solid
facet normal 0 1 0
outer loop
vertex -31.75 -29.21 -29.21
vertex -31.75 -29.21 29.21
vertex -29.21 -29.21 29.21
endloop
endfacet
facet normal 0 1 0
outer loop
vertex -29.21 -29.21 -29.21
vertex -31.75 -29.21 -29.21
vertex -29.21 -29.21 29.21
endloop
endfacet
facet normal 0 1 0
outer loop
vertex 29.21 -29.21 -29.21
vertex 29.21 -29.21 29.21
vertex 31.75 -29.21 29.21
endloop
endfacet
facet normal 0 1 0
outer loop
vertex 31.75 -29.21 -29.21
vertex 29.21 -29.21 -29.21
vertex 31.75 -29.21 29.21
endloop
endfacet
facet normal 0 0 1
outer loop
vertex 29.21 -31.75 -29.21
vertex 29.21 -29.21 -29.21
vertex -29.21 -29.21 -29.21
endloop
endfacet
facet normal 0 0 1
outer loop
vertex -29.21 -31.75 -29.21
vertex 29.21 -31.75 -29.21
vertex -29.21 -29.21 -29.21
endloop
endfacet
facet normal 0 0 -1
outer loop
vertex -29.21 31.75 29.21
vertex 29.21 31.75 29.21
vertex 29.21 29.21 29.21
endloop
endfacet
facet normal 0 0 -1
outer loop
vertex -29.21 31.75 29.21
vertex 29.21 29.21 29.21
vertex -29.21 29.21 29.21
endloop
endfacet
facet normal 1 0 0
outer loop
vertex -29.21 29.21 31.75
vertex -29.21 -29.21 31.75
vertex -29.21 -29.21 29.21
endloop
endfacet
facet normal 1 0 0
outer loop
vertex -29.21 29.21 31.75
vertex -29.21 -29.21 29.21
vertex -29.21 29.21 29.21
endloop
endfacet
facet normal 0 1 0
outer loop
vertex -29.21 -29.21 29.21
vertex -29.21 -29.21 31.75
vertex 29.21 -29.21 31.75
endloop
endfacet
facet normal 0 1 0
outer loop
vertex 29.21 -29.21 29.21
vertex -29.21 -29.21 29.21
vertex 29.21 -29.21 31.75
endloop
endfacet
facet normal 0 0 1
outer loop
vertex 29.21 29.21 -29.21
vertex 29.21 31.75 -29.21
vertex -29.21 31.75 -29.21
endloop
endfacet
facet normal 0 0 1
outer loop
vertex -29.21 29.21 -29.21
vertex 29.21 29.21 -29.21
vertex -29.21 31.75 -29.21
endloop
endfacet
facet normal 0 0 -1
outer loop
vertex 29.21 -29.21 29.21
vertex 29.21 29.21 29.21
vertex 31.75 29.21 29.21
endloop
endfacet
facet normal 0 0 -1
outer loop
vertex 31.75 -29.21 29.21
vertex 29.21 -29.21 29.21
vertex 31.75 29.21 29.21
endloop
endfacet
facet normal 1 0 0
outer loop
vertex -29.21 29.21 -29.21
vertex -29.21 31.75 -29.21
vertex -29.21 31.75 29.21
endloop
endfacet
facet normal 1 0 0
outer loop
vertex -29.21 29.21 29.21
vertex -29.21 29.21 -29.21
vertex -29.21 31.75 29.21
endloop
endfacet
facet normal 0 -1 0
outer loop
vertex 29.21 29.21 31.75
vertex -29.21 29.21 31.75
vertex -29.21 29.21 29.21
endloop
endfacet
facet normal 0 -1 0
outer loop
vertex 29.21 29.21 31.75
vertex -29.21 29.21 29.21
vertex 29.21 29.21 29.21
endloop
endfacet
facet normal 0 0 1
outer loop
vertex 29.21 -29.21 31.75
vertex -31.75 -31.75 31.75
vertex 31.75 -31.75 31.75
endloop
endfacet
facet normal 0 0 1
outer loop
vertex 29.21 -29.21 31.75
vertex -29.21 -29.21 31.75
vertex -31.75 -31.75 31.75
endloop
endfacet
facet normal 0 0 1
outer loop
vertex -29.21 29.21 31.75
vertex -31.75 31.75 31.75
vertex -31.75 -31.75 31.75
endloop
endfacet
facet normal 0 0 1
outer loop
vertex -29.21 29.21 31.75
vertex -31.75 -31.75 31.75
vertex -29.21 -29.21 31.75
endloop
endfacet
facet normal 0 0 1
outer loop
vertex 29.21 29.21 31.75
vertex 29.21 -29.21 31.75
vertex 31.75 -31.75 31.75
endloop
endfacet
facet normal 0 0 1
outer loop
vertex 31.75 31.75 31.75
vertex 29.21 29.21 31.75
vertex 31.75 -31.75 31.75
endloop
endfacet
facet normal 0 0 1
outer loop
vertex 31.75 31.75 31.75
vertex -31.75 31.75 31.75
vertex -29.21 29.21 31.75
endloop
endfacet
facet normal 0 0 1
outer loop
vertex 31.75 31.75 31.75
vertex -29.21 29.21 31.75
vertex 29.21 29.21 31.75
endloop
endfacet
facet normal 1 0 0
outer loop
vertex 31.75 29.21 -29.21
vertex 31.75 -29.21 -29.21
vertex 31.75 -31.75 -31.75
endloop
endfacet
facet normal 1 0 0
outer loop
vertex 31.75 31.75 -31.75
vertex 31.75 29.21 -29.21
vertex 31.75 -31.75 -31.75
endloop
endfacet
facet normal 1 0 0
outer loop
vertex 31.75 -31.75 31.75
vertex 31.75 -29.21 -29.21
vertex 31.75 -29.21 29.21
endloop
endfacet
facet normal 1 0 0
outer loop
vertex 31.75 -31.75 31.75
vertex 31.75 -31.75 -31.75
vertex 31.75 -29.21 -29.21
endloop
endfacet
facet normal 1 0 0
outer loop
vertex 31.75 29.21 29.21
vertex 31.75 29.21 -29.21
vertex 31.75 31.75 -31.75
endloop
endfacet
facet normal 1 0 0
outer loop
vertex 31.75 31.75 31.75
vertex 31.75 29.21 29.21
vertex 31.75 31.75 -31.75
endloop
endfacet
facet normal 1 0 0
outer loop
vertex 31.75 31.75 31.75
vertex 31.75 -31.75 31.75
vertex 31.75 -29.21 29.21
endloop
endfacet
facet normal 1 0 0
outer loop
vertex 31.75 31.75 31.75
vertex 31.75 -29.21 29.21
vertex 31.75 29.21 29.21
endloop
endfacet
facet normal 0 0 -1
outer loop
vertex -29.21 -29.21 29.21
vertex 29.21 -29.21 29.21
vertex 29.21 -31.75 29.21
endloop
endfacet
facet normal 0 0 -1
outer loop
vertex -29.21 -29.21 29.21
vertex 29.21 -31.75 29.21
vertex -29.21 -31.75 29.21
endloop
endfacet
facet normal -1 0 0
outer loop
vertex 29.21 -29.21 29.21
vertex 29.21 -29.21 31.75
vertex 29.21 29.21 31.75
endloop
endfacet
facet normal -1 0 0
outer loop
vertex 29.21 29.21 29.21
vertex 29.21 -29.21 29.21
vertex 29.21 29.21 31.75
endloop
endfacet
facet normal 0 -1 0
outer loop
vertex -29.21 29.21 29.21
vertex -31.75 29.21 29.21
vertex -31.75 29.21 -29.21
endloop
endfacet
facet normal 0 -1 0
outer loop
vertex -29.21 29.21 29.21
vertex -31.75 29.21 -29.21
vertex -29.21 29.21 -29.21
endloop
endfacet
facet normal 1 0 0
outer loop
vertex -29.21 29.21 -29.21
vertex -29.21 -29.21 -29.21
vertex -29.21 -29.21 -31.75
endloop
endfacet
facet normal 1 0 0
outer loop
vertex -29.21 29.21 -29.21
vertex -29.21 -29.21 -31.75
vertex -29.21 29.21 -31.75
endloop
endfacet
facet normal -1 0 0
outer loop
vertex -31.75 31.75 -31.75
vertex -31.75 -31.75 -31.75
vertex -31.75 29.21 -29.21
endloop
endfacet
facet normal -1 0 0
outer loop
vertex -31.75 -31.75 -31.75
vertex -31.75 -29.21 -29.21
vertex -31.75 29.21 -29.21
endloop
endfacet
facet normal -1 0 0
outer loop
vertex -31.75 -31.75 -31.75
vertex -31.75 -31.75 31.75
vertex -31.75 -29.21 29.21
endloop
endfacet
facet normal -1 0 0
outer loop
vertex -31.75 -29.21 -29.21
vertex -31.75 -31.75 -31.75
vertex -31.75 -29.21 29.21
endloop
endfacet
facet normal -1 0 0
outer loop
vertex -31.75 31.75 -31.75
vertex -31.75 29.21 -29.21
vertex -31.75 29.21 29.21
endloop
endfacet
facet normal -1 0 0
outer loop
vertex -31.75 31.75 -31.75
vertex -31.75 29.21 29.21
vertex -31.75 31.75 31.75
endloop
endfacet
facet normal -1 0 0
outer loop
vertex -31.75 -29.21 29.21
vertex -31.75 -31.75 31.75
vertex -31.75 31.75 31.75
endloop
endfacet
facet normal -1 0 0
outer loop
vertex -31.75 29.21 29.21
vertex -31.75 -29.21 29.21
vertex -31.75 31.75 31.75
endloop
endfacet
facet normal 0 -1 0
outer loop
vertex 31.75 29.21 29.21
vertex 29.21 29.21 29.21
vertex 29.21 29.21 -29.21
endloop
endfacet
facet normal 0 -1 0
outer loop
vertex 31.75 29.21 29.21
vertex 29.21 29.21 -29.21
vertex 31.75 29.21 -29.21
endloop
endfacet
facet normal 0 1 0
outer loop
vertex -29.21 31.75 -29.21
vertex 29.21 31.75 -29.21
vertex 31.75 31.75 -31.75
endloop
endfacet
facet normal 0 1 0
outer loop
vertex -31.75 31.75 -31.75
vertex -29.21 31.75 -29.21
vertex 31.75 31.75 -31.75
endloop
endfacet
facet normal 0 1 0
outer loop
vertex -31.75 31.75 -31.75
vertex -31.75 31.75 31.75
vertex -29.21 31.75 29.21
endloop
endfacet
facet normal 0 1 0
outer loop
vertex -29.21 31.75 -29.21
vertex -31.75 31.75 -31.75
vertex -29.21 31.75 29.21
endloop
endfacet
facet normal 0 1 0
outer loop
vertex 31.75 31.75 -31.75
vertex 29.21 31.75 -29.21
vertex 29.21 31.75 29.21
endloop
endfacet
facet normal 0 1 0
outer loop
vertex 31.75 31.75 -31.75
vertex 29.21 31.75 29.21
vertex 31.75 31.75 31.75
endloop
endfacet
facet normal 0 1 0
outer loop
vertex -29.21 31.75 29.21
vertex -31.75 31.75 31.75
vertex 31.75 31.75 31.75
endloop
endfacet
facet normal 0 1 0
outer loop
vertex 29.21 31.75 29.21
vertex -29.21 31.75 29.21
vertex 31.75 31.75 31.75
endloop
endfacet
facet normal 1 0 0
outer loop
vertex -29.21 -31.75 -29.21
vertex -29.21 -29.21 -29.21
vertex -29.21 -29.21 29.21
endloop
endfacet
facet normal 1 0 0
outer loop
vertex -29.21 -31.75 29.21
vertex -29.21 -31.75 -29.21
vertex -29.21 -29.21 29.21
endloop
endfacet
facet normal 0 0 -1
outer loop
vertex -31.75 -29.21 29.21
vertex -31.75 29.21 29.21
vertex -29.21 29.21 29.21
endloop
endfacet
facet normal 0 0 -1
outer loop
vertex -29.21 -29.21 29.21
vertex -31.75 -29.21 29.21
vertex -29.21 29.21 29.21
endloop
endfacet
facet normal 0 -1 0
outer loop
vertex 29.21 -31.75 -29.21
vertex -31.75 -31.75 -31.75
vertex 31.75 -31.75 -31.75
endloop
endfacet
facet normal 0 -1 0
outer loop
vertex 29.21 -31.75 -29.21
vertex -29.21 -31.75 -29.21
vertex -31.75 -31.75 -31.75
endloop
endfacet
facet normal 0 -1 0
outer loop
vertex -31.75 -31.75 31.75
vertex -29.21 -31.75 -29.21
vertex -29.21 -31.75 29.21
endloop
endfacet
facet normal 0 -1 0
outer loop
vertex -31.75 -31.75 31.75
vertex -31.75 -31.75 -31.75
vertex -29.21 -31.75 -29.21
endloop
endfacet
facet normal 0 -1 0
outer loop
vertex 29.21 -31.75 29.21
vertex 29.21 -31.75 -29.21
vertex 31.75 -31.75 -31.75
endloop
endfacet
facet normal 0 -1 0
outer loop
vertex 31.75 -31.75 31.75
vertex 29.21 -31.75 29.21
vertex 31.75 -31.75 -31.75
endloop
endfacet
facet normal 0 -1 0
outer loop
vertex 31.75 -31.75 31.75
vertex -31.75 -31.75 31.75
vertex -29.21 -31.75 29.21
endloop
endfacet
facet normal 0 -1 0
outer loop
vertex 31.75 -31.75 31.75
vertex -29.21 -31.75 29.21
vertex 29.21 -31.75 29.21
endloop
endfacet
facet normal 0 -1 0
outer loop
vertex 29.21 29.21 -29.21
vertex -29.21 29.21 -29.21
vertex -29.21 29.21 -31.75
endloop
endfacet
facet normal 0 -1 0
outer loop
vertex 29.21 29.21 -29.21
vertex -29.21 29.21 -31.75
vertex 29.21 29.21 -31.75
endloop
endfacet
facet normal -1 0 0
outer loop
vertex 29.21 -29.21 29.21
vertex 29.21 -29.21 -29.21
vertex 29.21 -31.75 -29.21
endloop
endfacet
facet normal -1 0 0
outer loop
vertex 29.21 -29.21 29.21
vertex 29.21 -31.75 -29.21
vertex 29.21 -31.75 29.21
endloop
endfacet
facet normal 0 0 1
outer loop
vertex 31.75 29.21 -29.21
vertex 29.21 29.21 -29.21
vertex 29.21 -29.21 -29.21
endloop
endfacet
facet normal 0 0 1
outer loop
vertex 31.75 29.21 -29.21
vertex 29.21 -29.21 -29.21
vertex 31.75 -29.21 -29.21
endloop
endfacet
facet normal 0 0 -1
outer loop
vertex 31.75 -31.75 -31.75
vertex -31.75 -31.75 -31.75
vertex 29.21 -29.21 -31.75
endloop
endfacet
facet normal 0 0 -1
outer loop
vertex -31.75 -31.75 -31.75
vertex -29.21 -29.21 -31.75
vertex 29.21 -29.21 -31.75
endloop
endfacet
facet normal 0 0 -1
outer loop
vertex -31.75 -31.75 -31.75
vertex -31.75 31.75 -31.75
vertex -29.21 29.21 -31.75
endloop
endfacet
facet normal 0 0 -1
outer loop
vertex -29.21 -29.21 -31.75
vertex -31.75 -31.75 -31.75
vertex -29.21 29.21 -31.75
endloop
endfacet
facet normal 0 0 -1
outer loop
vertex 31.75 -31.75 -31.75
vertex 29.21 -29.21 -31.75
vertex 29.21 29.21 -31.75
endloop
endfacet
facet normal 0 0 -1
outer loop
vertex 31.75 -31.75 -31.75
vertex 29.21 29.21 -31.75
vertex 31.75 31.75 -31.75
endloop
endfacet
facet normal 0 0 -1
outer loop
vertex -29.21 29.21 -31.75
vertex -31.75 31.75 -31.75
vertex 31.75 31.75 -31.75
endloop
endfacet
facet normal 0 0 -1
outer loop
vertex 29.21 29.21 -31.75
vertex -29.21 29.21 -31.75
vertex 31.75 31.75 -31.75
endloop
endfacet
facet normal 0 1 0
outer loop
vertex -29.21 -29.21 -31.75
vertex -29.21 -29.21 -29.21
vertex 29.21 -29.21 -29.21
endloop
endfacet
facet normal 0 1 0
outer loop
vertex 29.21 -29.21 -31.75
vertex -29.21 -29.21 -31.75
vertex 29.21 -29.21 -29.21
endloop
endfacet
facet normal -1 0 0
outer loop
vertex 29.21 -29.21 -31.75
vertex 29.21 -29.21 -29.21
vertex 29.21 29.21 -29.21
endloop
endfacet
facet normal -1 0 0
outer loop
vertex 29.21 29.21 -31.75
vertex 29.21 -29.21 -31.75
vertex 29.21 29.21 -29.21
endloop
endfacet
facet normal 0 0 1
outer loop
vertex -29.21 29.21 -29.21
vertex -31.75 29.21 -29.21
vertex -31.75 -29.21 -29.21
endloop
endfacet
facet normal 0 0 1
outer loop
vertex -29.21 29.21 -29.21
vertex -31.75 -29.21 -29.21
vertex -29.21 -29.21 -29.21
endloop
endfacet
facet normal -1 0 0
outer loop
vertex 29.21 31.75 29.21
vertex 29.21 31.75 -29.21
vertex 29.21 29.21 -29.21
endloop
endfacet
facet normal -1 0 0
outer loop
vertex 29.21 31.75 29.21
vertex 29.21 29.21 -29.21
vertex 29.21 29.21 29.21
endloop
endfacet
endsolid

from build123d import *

# Parameters (mm, degrees)
F0_W     = 63.5
F0_H     = 63.5
F1_DEPTH = 31.75
F2_T     = -2.54
F3_DEPTH = 2.541
F4_W     = 58.42
F4_H     = 58.42
F5_DEPTH = 63.501
F6_W     = 58.42
F6_H     = 58.42
F7_DEPTH = 63.501


with BuildPart() as f1:
    # F0 (on Top) → F1 (new body, symmetric)
    with BuildSketch(Plane.XY):
        Rectangle(F0_W, F0_H)
    extrude(amount=F1_DEPTH, both=True)

    # F2
    f2_openings = [f1.faces().sort_by_distance(p)[0] for p in [
        (-31.75, 0, 0),
    ]]
    offset(amount=F2_T, openings=f2_openings)

    # F3 (cut, through all): a face of the model
    f3_faces = [f1.faces().sort_by_distance(p)[0] for p in [
        (29.21, 0, 0),
    ]]
    extrude(f3_faces, amount=-F3_DEPTH, mode=Mode.SUBTRACT)

    # F4 (on face) → F5 (cut, through all)
    with BuildSketch(Plane.XY.offset(31.75)):
        Rectangle(F4_W, F4_H)
    extrude(amount=-F5_DEPTH, mode=Mode.SUBTRACT)

    # F6 (on face) → F7 (cut, through all)
    with BuildSketch(Plane(origin=(0, 31.75, 0), x_dir=(-1, 0, 0), z_dir=(0, 1, 0))):
        Rectangle(F6_W, F6_H)
    extrude(amount=-F7_DEPTH, mode=Mode.SUBTRACT)


solid = f1.part
